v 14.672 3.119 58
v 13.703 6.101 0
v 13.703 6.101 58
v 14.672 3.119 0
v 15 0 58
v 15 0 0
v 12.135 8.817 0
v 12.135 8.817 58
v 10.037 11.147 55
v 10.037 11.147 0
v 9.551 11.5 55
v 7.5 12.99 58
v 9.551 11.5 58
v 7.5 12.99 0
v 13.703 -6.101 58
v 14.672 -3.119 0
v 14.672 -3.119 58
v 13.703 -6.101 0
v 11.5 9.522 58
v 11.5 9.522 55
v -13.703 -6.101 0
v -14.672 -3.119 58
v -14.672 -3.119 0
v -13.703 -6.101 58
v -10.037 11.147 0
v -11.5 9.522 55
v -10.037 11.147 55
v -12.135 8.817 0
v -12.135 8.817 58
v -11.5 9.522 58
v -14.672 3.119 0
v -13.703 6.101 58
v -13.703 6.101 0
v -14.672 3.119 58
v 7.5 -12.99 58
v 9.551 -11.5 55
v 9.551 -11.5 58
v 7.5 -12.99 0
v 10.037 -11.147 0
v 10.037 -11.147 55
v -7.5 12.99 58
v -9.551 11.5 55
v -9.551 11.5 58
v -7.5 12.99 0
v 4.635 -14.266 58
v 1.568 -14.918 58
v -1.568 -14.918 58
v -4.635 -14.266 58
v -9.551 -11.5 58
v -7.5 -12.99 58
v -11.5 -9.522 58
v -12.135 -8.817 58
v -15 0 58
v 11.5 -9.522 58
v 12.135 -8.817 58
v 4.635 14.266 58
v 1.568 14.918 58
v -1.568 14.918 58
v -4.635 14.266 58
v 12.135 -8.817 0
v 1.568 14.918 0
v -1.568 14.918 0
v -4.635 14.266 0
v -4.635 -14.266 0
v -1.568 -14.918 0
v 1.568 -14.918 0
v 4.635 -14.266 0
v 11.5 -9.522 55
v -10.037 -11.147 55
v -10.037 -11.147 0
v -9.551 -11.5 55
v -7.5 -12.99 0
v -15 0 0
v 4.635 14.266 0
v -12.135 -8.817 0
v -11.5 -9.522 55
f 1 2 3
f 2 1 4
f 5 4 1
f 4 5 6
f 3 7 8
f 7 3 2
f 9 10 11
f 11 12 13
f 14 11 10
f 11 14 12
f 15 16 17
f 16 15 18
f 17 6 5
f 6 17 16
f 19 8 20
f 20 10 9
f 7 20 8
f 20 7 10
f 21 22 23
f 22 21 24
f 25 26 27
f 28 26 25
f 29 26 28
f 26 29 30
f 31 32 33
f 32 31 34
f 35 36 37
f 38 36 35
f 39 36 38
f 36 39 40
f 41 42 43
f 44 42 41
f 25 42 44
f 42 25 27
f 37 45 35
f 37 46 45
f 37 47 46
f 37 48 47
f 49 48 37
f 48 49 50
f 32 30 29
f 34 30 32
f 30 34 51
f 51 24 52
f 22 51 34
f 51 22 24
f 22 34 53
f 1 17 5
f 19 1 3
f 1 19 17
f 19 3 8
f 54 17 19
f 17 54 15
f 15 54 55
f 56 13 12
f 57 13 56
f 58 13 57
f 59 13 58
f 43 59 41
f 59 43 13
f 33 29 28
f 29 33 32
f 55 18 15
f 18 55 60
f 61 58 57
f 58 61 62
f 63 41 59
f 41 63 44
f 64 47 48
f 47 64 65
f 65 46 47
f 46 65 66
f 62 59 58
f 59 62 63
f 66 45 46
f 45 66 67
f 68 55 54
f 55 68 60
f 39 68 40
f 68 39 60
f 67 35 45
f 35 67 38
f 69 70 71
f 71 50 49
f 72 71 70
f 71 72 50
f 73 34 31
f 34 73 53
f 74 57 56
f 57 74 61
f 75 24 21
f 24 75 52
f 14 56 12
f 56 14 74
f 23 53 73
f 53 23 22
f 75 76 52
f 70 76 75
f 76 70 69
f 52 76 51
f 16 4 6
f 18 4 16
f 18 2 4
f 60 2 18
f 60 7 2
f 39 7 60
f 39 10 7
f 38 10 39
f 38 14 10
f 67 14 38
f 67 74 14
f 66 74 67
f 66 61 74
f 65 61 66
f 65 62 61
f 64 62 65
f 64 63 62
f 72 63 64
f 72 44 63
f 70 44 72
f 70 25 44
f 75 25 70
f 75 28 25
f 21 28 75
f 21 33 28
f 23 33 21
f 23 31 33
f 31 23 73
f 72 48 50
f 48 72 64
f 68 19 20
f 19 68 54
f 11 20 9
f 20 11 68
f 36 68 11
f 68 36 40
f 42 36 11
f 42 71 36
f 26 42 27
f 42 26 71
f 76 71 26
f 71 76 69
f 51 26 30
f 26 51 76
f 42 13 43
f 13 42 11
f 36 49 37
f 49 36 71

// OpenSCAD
// 17 deg 
// 5.5 cm tall
// 2x2 cm base


module v1(){
difference() {


cube([30,30,55+3]);


translate([4,4,55]) cube([22,22,10]);
}

hull(){
cylinder (r=5, h=5);
translate([30,0,0]) cylinder (r=5, h=5);
translate([0,30,0]) cylinder (r=5, h=5);
translate([30,30,0]) cylinder (r=5, h=5);
}
}



module v2() {
difference() {
cube([30,30,55+3]);
translate([4,4,0]) cube([22,22,55+3]);
}

translate([4,4,40-3])
difference(){

 cube([22,22,18]);
translate([11,11,0]) sphere (r=15);

}
}


module v3() {
    
    difference() {
    cylinder (d = 30, h=55+3);
        translate([0,0,55+11-3-3]) cube([23,23,10], center = true);
    }
}



v3();
